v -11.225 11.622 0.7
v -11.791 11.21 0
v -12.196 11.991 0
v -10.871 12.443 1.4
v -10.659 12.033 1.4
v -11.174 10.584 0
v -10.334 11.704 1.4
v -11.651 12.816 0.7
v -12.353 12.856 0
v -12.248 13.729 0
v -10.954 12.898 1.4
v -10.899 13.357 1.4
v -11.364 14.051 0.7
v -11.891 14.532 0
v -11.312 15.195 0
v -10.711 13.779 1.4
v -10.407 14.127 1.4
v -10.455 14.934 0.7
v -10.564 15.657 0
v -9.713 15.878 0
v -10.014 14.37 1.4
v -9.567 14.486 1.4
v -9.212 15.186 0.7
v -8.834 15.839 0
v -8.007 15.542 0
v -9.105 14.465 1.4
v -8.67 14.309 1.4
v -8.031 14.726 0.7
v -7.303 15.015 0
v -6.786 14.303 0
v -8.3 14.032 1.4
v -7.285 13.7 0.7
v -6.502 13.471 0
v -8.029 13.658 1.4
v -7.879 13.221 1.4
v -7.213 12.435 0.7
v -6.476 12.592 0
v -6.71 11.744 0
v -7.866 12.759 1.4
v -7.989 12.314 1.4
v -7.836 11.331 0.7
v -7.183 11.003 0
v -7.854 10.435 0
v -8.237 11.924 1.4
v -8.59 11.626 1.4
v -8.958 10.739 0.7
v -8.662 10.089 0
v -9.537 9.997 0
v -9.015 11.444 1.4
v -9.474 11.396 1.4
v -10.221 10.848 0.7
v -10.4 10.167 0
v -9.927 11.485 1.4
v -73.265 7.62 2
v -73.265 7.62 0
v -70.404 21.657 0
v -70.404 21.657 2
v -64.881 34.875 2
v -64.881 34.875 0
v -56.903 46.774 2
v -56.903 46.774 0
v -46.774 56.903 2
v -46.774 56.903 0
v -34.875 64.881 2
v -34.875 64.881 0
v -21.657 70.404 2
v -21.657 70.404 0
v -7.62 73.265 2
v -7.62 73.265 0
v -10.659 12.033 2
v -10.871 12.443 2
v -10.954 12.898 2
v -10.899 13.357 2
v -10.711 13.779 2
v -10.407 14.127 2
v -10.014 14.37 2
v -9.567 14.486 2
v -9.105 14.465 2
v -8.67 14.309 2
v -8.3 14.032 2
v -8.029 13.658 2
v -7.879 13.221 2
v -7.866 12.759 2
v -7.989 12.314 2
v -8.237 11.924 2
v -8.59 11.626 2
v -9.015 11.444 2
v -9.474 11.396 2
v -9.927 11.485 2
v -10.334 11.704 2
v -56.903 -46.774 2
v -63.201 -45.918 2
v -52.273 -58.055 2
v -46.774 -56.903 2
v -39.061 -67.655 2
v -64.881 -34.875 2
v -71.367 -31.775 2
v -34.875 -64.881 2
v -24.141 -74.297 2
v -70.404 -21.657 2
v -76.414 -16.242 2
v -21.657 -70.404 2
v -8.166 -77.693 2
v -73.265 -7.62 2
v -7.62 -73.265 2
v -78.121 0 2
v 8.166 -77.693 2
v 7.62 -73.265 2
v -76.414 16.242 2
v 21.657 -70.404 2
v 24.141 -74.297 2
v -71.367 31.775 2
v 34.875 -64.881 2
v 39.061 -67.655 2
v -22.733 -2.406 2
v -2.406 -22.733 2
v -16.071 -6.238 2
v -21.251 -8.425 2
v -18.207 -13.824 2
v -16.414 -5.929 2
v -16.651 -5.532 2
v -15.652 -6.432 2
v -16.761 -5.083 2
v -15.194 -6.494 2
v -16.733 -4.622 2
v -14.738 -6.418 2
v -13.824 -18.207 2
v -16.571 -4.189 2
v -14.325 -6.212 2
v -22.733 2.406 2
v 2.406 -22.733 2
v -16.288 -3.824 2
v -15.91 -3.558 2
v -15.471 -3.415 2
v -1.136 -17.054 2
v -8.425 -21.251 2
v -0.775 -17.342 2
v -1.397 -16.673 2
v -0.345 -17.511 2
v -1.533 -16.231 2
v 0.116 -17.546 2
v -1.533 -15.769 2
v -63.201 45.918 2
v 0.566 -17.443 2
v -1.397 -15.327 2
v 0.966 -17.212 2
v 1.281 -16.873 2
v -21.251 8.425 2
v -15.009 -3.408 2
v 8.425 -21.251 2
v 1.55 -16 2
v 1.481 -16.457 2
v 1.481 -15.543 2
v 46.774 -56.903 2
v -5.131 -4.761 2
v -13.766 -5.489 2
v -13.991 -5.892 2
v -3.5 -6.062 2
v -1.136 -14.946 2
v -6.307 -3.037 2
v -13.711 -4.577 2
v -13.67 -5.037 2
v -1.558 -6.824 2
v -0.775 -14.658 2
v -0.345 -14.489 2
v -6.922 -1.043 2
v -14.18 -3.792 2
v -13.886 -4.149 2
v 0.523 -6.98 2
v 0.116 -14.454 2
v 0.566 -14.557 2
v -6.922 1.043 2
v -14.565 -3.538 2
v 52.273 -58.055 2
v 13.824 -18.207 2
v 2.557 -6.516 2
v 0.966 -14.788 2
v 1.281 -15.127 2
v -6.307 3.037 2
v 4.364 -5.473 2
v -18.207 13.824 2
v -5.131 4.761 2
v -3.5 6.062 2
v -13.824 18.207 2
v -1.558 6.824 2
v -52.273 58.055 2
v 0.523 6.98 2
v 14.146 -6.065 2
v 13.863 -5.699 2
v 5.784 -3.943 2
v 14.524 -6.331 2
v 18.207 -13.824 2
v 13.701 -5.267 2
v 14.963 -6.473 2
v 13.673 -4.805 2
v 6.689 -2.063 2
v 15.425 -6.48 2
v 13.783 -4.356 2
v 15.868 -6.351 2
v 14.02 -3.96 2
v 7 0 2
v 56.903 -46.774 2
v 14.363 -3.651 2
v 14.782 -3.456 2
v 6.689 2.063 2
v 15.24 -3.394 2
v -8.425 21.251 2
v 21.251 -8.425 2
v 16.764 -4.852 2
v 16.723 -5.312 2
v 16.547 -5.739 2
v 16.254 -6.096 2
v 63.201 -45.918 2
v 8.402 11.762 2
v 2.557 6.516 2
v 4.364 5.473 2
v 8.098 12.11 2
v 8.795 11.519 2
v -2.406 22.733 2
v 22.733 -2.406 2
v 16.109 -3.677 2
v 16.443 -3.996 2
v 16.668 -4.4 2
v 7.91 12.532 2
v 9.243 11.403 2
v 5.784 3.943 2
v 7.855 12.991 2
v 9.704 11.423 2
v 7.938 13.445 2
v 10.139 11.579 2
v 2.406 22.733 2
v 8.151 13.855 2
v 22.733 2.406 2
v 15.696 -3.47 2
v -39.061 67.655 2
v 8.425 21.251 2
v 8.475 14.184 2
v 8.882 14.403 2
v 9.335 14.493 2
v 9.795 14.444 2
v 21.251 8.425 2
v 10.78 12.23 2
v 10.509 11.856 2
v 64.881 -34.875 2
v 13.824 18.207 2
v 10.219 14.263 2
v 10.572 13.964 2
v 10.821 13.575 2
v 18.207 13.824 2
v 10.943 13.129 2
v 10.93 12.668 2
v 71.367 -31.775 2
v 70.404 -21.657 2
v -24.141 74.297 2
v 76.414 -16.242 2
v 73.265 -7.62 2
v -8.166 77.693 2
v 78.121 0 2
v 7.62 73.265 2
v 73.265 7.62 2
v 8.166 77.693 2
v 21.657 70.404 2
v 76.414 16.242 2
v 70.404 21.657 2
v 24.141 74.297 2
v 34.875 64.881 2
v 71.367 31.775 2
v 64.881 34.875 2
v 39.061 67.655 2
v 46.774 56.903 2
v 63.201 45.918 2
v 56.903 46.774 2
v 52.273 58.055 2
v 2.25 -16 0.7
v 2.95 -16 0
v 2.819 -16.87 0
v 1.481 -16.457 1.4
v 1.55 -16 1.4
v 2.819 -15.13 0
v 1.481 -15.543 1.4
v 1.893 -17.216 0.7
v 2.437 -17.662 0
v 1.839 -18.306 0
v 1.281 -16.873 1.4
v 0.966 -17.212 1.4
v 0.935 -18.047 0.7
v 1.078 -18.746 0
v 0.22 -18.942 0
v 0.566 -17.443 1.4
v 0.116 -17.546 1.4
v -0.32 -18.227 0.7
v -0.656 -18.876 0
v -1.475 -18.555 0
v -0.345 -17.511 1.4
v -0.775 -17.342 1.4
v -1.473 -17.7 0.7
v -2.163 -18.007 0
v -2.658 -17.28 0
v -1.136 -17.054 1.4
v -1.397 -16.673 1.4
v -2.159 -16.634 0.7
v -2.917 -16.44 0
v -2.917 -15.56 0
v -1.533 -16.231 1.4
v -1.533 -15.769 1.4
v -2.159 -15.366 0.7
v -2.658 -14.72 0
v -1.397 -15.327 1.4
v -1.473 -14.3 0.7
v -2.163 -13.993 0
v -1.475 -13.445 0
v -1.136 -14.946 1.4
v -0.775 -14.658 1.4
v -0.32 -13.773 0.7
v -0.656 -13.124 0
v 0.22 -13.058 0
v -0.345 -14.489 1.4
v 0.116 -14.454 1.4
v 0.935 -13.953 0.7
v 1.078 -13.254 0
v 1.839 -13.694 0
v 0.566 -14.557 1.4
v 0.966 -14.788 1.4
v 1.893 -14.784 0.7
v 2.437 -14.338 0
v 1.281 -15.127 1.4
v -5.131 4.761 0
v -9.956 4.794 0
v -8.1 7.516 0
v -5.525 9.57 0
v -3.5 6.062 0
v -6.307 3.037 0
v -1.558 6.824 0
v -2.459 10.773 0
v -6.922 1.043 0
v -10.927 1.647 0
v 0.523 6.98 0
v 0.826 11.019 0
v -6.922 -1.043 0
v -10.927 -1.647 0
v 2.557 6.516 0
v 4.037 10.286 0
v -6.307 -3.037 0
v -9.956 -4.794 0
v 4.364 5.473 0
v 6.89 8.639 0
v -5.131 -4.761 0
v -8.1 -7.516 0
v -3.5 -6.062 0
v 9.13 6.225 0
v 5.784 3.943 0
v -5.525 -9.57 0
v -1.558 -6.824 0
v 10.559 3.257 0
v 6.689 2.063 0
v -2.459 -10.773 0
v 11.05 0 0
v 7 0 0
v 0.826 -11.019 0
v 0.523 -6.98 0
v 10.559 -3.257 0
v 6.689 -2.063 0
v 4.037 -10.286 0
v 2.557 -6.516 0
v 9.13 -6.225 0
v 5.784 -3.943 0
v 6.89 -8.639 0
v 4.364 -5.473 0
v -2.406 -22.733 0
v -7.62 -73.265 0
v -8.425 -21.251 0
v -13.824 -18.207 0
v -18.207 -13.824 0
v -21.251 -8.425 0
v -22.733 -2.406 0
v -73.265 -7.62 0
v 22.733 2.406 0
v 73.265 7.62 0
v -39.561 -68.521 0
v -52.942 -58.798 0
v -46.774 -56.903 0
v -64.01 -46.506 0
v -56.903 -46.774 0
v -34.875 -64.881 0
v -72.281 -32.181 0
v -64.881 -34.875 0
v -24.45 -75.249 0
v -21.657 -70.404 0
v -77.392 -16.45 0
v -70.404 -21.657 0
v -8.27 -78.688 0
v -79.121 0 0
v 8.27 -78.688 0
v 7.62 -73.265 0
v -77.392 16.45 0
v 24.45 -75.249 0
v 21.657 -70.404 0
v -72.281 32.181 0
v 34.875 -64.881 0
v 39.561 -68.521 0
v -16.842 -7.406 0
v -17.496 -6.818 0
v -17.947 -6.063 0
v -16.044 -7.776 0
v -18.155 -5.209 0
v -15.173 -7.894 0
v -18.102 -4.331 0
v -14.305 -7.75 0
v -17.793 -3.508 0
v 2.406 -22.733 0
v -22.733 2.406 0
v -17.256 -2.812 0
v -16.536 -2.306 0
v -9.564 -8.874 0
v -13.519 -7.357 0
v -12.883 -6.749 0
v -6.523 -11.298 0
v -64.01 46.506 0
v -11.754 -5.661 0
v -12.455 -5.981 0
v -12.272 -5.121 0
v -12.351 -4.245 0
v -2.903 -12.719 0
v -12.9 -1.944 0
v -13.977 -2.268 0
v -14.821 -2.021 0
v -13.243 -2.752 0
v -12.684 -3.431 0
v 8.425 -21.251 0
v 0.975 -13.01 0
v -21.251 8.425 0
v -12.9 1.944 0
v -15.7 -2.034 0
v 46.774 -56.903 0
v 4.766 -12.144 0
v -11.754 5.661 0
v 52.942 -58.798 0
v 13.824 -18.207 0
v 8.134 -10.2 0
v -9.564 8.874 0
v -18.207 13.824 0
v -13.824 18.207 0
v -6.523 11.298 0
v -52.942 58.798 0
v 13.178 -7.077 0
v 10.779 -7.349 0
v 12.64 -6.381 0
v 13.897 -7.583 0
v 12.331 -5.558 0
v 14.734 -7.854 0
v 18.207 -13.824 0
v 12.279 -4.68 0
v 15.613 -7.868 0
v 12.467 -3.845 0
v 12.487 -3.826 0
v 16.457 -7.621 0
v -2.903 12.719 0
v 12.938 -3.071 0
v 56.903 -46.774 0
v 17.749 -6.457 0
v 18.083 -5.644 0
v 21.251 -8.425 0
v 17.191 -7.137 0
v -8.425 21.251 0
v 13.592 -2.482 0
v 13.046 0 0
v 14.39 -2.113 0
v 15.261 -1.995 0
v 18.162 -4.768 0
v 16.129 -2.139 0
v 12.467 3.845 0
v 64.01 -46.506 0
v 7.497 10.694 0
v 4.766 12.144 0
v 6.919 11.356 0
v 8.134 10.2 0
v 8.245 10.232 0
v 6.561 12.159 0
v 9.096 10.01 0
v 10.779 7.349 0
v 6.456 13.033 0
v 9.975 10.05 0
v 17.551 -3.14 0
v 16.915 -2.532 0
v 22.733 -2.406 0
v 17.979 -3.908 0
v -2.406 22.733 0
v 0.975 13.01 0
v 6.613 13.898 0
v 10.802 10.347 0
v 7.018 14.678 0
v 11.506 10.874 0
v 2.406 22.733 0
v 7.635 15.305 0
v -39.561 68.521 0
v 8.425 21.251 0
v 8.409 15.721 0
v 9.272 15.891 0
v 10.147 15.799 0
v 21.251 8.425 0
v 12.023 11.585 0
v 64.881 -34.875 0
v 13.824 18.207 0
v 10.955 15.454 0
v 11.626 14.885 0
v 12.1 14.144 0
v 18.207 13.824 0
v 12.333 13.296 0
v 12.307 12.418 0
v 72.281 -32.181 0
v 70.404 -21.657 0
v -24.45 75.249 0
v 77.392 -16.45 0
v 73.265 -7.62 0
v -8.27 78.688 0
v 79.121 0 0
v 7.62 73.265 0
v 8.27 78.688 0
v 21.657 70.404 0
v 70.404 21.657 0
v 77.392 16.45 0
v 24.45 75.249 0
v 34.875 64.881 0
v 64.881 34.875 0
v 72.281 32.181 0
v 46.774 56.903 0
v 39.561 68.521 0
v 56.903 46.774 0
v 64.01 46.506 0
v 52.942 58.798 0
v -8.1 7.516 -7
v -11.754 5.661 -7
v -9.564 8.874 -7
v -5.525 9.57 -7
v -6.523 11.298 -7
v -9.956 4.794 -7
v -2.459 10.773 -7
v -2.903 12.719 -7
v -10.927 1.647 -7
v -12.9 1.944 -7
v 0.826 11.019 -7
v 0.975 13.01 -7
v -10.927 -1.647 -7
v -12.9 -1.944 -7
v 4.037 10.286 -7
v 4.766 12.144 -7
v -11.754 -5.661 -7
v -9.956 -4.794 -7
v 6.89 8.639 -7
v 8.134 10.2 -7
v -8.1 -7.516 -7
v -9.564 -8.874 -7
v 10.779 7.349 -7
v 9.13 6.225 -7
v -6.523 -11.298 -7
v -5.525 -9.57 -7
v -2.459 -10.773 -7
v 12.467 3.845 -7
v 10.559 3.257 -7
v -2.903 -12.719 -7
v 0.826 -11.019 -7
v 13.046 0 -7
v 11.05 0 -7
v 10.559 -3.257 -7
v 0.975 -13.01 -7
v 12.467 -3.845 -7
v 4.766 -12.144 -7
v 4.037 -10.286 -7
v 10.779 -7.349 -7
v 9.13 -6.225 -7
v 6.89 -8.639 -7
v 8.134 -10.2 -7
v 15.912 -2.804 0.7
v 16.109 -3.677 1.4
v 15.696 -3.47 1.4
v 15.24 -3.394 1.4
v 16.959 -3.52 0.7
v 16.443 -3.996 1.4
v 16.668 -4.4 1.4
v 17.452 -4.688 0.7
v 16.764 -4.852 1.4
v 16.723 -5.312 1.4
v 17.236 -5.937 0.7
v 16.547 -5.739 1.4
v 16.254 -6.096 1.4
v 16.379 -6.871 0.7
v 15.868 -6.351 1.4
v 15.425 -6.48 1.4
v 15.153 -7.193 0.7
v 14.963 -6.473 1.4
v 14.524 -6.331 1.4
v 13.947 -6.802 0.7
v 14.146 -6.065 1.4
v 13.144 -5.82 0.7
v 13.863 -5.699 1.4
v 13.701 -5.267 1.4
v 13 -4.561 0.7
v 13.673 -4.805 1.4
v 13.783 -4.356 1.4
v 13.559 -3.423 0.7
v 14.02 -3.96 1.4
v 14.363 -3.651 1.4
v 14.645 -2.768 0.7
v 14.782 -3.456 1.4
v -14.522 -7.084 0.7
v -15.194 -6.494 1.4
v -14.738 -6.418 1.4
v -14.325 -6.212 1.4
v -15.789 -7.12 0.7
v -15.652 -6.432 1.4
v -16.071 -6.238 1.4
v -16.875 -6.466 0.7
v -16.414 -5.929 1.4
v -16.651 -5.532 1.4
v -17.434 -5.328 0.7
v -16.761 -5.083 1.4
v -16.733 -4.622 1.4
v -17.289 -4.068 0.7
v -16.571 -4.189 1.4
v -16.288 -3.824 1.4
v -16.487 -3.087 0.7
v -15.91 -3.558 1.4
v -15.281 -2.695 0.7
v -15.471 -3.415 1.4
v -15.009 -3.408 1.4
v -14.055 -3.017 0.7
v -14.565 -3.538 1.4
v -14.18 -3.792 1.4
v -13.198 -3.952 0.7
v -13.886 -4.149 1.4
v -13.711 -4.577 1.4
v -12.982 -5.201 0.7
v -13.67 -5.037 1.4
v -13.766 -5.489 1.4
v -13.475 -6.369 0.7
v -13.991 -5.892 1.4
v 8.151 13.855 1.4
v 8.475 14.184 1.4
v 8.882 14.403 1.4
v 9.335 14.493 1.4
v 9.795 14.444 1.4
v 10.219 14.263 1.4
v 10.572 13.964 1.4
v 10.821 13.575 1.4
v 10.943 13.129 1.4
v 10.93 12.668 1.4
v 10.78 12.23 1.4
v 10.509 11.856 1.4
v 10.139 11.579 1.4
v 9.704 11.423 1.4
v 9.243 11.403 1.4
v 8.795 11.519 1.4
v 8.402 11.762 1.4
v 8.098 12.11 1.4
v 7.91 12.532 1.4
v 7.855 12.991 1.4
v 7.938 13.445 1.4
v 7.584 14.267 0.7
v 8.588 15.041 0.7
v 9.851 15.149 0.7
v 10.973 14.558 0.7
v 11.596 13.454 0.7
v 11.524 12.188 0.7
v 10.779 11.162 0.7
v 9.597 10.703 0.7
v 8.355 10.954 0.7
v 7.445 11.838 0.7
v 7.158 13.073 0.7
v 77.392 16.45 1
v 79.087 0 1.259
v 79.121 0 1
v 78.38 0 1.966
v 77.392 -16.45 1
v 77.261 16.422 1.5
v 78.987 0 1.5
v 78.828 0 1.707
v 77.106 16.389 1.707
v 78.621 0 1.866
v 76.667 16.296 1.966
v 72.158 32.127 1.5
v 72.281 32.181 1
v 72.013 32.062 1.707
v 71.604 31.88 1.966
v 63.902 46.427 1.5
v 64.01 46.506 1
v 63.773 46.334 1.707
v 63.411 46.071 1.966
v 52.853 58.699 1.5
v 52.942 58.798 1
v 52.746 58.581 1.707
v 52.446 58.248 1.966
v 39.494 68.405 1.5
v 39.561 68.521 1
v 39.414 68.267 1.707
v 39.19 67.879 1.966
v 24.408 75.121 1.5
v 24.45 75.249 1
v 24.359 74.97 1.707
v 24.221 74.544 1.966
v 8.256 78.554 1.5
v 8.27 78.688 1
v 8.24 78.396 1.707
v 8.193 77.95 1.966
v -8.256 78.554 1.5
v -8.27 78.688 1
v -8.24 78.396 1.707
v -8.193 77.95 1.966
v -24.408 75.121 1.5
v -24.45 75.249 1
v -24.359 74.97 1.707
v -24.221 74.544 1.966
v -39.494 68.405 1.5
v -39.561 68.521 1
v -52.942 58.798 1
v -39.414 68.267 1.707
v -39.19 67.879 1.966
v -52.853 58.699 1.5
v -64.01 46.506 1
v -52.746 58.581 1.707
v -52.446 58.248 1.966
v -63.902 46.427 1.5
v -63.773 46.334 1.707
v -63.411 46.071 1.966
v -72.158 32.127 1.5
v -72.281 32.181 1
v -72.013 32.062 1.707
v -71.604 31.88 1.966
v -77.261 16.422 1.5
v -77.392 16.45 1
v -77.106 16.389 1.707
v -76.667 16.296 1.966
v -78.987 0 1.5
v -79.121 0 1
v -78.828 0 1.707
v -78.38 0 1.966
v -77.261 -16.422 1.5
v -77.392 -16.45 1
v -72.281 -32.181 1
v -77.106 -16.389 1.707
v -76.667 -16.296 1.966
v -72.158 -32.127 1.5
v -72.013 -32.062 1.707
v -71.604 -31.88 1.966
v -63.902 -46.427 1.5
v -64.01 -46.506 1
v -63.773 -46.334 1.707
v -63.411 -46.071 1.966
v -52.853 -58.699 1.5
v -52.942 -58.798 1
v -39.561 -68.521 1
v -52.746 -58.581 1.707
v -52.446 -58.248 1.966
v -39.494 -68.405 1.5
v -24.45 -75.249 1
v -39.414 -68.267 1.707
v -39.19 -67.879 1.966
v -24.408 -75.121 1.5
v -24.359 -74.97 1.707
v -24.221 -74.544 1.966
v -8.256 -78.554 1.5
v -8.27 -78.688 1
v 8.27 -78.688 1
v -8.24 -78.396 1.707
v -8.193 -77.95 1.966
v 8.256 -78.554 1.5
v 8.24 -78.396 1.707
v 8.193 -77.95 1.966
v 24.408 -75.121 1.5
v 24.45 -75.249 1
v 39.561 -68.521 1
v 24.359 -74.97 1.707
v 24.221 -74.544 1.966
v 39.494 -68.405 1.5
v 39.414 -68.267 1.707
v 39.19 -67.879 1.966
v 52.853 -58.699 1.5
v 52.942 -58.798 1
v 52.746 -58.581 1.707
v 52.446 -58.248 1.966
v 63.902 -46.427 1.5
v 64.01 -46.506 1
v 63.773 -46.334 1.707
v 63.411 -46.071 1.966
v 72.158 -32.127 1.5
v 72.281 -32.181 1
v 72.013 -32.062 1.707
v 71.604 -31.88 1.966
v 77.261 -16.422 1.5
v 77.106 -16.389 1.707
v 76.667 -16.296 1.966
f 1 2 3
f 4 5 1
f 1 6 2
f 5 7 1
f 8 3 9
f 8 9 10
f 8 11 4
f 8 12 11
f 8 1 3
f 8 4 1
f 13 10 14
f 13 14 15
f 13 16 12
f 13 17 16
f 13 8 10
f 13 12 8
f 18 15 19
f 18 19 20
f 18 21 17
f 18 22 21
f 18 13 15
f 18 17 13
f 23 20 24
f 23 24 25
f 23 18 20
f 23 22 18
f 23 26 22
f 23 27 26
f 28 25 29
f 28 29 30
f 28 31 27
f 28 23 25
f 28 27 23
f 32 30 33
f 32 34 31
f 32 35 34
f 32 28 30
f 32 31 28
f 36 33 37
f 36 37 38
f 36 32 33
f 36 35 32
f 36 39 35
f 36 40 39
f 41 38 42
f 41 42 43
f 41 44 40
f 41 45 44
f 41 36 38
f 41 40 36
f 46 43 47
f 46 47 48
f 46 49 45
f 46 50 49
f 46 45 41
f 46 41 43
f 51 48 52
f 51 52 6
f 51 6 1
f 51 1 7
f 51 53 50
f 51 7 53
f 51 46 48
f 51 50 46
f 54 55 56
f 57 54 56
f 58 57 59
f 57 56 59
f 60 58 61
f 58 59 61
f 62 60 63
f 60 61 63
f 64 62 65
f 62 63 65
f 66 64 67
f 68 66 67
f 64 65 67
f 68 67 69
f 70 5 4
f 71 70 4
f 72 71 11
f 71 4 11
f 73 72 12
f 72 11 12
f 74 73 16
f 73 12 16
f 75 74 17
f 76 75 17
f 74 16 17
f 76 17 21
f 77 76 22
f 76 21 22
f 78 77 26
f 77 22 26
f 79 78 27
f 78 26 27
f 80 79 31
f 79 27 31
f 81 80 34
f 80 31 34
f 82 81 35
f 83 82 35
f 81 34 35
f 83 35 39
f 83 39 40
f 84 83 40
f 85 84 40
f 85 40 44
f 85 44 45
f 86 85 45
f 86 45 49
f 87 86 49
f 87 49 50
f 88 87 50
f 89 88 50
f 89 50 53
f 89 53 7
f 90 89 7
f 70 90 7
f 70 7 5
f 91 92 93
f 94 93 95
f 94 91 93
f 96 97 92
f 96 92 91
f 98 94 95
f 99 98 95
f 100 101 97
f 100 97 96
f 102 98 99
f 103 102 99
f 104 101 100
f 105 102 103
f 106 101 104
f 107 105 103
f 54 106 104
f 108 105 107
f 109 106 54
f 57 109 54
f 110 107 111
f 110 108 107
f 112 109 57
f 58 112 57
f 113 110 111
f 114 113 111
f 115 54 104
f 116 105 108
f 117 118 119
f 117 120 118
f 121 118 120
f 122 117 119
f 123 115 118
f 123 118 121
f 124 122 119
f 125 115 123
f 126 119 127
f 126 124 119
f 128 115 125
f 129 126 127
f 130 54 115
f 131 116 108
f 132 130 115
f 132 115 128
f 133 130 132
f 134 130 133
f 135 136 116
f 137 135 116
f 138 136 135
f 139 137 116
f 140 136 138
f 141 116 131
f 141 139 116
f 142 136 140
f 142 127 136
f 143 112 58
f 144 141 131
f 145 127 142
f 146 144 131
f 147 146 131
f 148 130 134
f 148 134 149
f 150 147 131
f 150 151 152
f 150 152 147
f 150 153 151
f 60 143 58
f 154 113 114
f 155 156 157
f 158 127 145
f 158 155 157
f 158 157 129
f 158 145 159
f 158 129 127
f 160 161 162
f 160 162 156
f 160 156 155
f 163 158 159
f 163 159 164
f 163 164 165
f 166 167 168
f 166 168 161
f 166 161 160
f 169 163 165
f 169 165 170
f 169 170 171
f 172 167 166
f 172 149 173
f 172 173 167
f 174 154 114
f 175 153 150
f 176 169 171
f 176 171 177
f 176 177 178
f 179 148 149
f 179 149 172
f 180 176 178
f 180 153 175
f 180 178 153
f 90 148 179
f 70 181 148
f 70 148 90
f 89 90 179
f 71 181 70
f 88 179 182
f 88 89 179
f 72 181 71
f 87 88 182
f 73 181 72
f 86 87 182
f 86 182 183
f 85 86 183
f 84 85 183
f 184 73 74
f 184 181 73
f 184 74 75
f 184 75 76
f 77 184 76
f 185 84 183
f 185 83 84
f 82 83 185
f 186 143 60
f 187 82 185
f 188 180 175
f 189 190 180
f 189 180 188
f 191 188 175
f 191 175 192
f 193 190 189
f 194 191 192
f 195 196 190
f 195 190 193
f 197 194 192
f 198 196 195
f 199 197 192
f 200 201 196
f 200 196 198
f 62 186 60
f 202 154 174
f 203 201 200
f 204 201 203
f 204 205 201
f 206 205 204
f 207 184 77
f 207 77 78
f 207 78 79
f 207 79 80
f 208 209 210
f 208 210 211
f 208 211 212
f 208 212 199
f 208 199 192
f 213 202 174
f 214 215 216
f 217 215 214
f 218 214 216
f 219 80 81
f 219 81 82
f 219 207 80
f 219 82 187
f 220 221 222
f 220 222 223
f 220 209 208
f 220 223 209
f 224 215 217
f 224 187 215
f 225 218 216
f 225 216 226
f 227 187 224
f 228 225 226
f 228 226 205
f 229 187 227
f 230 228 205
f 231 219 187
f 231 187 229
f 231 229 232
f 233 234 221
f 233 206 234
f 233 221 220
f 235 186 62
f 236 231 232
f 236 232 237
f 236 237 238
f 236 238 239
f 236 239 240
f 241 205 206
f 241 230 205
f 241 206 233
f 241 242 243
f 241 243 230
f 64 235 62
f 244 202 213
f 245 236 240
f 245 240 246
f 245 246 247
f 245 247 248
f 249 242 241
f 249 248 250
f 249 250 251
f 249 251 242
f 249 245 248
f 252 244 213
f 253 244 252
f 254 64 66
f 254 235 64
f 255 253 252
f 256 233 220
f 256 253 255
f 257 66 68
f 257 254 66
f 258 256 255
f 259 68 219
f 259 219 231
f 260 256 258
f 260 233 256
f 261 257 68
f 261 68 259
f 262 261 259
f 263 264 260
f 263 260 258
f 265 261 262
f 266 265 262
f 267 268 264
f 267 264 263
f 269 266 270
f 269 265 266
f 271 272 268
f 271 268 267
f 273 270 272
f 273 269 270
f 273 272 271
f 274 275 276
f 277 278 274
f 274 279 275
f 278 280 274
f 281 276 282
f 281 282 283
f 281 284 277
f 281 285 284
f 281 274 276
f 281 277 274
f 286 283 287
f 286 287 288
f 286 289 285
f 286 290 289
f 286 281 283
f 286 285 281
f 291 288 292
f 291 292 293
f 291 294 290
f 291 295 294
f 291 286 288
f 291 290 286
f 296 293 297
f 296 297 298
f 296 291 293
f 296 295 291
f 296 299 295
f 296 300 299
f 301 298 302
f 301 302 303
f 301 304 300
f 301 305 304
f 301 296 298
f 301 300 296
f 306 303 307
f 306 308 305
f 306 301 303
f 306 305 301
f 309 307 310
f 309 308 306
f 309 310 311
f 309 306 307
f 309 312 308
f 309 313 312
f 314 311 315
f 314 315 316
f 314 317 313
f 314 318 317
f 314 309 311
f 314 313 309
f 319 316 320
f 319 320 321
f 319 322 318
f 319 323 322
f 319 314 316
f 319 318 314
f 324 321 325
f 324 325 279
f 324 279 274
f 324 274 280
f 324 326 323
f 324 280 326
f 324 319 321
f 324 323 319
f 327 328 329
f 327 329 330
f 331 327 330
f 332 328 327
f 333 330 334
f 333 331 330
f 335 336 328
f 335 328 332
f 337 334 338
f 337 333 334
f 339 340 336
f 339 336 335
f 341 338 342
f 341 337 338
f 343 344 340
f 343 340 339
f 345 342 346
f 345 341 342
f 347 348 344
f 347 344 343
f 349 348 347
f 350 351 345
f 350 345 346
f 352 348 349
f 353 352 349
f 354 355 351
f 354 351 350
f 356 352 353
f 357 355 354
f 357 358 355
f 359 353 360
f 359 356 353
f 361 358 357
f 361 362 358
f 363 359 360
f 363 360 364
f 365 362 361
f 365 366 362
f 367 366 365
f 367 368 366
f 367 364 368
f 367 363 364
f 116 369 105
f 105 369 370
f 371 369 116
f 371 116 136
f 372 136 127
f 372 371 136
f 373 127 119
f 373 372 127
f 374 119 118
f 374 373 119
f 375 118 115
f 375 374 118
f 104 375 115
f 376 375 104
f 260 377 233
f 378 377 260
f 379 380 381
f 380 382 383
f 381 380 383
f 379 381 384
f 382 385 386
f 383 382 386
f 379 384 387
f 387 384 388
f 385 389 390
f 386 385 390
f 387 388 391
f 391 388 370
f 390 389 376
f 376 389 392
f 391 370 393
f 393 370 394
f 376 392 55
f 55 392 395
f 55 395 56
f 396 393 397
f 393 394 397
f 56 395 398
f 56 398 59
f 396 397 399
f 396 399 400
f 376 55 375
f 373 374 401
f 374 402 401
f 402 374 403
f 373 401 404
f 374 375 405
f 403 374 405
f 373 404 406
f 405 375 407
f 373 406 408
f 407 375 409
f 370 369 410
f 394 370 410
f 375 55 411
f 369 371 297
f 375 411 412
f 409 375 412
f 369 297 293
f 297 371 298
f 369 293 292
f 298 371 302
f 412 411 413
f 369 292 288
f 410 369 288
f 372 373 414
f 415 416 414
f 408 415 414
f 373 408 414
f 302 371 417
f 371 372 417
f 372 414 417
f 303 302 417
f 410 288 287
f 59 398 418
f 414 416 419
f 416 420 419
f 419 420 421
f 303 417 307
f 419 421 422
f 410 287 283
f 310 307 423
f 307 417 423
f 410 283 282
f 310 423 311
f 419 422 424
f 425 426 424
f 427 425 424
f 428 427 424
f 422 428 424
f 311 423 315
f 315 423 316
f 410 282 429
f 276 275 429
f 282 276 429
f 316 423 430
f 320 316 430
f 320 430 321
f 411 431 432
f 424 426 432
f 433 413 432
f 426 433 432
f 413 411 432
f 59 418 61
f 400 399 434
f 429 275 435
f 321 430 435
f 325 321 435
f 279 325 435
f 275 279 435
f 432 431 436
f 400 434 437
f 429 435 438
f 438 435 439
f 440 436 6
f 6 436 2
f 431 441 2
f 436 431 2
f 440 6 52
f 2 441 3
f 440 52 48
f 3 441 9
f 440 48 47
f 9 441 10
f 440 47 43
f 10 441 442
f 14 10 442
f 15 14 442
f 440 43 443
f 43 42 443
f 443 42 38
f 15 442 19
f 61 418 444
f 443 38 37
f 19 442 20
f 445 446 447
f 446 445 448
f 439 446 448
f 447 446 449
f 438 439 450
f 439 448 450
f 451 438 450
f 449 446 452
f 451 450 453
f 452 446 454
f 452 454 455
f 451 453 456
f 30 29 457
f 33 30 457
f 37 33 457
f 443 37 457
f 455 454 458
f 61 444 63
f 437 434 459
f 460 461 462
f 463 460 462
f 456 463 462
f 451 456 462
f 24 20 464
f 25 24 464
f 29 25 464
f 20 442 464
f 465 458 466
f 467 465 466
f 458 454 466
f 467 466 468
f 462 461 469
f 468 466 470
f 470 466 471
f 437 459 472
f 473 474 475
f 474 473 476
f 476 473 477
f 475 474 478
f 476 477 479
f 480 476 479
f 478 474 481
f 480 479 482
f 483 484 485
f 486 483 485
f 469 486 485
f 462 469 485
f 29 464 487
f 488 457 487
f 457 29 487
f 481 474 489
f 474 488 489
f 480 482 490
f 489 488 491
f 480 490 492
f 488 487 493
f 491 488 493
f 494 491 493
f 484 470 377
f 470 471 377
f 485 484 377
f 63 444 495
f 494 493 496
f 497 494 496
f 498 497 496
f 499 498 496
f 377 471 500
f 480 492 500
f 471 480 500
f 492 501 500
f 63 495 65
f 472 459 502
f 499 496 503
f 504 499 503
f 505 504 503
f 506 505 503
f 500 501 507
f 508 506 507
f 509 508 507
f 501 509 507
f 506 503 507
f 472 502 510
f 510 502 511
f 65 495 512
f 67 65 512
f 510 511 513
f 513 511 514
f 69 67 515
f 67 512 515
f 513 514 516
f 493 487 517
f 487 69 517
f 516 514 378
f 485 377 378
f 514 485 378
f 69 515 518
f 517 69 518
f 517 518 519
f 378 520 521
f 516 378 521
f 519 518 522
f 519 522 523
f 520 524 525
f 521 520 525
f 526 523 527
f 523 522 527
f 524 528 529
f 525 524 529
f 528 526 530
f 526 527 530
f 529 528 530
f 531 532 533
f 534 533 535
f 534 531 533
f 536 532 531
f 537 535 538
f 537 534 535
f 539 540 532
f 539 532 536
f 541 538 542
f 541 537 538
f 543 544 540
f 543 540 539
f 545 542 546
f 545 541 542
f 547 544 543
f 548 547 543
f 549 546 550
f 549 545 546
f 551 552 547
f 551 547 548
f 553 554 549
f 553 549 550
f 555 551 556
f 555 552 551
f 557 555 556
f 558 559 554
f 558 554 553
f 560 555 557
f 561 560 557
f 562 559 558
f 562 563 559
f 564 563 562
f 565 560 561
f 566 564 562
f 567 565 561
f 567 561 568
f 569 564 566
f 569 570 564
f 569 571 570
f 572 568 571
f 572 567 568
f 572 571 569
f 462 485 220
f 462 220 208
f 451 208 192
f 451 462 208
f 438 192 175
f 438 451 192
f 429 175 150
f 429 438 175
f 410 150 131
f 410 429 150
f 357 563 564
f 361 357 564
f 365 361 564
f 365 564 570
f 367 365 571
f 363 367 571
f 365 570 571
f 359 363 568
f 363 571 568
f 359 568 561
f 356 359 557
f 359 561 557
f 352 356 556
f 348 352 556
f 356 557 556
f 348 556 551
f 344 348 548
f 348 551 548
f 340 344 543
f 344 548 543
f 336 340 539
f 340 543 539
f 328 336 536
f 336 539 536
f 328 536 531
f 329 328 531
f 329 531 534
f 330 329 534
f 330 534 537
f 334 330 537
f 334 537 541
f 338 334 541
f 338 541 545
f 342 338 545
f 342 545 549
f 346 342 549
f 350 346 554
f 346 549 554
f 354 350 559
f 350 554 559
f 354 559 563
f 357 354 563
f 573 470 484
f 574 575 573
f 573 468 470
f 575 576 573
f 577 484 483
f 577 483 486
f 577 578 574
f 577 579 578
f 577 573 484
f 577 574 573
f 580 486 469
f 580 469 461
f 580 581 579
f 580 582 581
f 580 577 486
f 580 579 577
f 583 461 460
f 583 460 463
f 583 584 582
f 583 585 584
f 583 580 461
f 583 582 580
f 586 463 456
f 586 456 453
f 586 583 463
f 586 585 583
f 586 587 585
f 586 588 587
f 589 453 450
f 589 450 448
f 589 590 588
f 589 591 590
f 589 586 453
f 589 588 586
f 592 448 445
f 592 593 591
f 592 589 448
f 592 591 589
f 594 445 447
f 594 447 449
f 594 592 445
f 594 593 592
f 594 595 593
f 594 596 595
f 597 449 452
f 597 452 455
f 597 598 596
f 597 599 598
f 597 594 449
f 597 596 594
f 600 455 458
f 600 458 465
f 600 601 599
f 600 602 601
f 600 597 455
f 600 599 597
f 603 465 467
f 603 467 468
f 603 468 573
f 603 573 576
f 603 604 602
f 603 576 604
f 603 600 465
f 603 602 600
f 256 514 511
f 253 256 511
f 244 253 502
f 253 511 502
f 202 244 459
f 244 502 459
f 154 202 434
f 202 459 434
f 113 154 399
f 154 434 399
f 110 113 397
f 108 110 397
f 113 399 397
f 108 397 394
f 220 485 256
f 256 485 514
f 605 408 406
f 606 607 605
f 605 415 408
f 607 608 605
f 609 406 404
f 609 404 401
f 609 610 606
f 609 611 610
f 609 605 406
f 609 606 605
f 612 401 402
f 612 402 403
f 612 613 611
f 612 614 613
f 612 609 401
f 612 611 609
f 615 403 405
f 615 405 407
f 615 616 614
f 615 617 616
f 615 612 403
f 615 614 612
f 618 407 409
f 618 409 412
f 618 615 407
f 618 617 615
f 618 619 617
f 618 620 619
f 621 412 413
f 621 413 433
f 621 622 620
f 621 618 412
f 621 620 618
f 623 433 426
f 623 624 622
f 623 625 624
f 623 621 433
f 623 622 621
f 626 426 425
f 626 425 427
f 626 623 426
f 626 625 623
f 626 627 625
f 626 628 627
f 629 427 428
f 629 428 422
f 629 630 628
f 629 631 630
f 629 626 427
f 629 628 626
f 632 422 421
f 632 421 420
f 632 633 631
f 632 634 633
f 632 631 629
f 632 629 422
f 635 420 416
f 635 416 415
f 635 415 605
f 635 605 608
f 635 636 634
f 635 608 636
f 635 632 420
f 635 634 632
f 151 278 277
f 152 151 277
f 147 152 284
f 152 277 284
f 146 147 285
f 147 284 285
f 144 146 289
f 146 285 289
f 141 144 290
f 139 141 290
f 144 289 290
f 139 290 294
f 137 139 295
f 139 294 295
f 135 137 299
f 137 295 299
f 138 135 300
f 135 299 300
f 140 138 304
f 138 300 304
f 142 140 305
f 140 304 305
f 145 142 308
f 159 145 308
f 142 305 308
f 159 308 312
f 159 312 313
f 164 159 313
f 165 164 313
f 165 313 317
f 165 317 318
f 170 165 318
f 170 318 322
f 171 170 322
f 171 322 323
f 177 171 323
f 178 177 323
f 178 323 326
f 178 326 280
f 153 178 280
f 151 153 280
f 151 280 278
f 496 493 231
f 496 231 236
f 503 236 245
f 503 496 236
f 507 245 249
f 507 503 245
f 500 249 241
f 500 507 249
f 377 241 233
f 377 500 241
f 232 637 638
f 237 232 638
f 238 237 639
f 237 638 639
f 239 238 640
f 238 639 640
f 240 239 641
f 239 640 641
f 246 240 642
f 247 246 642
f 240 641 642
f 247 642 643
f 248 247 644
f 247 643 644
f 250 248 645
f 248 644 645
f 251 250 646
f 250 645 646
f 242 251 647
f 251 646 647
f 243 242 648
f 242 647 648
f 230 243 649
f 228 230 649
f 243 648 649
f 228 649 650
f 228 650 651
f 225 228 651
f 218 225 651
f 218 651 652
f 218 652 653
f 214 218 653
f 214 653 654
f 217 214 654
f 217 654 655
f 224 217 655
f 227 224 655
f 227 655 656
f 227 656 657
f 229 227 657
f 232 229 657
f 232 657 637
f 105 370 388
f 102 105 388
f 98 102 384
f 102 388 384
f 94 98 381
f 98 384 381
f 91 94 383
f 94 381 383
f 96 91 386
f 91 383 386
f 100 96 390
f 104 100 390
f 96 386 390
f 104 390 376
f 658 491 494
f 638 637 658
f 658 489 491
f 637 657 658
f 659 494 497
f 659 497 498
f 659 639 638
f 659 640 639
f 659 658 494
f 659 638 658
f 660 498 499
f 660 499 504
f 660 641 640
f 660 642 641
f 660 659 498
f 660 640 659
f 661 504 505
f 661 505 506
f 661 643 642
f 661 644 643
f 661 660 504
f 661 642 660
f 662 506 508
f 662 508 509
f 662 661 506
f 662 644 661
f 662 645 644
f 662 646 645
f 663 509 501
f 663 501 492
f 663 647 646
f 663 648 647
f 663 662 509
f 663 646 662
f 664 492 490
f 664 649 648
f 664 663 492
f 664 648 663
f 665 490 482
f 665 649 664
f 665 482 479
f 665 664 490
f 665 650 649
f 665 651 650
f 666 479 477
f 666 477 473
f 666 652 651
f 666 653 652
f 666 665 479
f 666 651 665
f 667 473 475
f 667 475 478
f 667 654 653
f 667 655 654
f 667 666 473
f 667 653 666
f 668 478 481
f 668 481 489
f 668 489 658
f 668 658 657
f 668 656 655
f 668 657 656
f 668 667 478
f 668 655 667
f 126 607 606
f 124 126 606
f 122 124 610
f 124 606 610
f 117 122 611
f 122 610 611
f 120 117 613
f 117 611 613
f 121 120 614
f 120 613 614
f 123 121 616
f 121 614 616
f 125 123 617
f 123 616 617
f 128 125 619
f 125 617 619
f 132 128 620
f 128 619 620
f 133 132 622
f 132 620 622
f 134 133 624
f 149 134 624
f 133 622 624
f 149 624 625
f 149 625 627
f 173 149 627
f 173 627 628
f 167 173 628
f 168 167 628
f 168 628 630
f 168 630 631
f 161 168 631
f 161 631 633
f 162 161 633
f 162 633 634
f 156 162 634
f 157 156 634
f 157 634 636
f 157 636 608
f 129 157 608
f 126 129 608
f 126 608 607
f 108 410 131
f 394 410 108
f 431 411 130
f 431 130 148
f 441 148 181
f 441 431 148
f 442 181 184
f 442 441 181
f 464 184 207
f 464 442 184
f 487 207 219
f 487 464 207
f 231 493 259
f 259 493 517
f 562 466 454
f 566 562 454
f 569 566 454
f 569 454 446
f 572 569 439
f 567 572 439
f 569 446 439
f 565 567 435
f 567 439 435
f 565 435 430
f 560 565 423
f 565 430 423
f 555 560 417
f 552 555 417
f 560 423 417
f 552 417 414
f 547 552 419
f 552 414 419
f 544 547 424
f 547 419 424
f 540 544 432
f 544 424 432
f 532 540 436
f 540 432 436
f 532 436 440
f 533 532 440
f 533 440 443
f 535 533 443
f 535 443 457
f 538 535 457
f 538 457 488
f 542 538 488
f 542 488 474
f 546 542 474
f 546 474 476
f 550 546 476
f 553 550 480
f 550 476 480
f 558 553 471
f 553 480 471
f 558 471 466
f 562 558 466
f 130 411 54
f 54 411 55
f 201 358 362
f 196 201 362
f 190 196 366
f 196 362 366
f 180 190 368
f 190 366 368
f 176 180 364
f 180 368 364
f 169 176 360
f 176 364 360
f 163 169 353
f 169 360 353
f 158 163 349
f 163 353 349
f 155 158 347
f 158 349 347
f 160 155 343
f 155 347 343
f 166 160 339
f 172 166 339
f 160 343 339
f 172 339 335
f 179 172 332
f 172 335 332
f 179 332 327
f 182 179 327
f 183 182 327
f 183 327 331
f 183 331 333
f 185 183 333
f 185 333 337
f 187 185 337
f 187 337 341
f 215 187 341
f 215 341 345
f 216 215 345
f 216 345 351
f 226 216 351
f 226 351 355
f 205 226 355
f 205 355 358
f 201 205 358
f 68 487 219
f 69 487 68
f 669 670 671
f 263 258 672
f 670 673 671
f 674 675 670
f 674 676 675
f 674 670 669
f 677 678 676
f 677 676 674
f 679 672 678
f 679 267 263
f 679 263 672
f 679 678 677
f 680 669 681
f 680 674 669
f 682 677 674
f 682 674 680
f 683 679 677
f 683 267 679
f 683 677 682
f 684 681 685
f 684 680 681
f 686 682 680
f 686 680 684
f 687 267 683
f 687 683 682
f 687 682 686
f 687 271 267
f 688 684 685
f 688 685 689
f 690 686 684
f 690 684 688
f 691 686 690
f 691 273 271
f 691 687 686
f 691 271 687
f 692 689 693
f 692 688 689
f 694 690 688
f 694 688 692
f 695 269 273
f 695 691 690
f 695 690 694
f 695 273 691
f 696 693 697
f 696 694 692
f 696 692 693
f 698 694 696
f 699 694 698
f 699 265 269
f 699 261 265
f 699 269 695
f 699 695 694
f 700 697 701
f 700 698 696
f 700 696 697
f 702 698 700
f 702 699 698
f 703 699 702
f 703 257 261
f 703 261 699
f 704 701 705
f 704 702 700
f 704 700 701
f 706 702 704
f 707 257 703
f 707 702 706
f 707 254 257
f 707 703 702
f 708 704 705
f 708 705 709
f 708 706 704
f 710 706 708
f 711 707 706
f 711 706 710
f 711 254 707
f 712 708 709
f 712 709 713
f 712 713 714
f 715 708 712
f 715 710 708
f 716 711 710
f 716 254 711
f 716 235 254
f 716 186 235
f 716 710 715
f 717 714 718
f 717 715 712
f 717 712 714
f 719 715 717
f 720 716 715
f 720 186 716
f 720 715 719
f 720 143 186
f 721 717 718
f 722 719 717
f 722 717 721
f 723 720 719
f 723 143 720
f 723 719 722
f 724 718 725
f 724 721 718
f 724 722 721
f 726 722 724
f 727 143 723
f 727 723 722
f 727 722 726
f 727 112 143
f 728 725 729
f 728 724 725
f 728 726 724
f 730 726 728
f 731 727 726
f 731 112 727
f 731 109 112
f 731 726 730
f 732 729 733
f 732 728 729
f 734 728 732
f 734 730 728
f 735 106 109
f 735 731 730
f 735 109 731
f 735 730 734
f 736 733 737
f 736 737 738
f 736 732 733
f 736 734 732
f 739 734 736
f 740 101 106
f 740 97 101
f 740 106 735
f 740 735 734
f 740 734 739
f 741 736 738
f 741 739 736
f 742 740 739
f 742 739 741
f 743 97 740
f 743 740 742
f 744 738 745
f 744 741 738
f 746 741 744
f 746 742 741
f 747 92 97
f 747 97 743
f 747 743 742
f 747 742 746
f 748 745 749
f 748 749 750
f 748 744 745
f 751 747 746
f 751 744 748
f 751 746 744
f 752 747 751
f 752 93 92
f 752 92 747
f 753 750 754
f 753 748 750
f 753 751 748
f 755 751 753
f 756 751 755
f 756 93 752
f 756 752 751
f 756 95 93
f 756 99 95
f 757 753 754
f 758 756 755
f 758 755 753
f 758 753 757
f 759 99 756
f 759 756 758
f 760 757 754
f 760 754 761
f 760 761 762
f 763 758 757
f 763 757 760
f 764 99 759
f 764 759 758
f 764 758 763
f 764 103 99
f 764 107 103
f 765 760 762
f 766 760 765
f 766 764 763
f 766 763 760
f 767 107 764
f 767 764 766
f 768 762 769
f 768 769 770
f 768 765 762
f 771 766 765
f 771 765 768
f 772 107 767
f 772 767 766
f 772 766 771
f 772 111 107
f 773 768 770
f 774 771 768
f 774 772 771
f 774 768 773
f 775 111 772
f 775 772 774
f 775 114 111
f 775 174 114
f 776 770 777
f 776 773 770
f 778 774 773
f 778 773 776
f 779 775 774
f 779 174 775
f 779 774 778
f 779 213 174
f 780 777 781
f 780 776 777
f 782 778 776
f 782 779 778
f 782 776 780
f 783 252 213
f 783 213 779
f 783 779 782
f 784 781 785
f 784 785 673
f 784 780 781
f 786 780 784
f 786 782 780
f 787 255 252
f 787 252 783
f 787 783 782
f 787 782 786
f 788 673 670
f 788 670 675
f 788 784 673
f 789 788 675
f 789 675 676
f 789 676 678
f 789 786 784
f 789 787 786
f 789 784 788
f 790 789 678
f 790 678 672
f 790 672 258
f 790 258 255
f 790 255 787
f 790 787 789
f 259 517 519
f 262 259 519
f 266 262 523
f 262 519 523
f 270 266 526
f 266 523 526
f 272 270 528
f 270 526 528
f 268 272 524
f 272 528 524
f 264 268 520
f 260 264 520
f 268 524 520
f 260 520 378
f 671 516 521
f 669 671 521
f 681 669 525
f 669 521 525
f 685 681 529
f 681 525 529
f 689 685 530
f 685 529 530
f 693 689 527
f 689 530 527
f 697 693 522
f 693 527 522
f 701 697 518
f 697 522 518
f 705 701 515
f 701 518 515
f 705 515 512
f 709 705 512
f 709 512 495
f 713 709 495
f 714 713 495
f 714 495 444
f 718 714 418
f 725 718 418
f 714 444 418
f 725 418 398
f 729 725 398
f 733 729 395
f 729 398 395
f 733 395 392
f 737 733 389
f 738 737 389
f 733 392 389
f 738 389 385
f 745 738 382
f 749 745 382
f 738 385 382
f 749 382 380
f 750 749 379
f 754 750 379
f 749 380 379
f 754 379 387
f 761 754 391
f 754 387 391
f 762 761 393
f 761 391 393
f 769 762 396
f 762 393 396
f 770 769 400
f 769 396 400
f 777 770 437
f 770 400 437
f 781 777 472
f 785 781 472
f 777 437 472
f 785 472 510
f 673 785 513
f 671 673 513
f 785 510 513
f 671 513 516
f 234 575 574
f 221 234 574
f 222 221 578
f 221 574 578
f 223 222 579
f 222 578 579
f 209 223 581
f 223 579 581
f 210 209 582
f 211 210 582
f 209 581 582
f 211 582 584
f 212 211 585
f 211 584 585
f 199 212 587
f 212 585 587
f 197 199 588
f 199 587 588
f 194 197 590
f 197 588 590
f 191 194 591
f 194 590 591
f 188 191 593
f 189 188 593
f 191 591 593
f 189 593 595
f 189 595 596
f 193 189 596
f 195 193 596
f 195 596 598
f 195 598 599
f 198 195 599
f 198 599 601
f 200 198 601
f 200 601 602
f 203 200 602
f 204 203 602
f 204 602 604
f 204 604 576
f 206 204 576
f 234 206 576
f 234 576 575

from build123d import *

# Parameters (mm, degrees)
SKETCH005_R           = 79.121
PAD_DEPTH             = 2
SKETCH010_R           = 13.0462
PAD001_DEPTH          = 7
SKETCH007_R           = 11.05
POCKET005_DEPTH       = 7
SKETCH006_R           = 7
POCKET006_DEPTH       = 5.0038
SKETCH008_R           = 1.55
POCKET007_DEPTH       = 5.0038
POLARPATTERN002_COUNT = 5
CHAMFER001_SIZE       = 1.4
POCKET008_DEPTH       = 5.0038
POLARPATTERN003_COUNT = 4
FILLET_R              = 0.999998


with BuildPart() as part:
    # Sketch005 → Pad (new body)
    with BuildSketch(Plane.XY):
        Circle(SKETCH005_R)
    extrude(amount=PAD_DEPTH)

    # Sketch010 (on Face2 of Pad) → Pad001 (join)
    with BuildSketch(Plane(origin=(0, 0, 0), x_dir=(1, 0, 0), z_dir=(0, 0, -1))):
        Circle(SKETCH010_R)
    extrude(amount=PAD001_DEPTH)

    # Sketch007 (on Face5 of Pad001) → Pocket005 (cut)
    with BuildSketch(Plane(origin=(0, 0, -7), x_dir=(1, 0, 0), z_dir=(0, 0, -1))):
        Circle(SKETCH007_R)
    extrude(amount=-POCKET005_DEPTH, mode=Mode.SUBTRACT)

    # Sketch006 (on Face801 of TimingGearT) → Pocket006 (cut)
    with BuildSketch(Plane(origin=(0, 0, 0), x_dir=(1, 0, 0), z_dir=(0, 0, -1))):
        Circle(SKETCH006_R)
    extrude(amount=-POCKET006_DEPTH, mode=Mode.SUBTRACT)

    # Sketch008 (on Face4 of Pocket002) → Pocket007 (cut)
    with BuildSketch(Plane(origin=(0, 0, 0), x_dir=(1, 0, 0), z_dir=(0, 0, -1))):
        with Locations((0, 16)):
            Circle(SKETCH008_R)
    pocket007 = extrude(amount=-POCKET007_DEPTH, mode=Mode.SUBTRACT)

    # PolarPattern002: Pocket007 ×5 about axis
    polarpattern002_axis = Axis((0, 0, 0), (0, 0, -1))
    for i in range(1, POLARPATTERN002_COUNT):
        add(pocket007.rotate(polarpattern002_axis, i * 360 / POLARPATTERN002_COUNT), mode=Mode.SUBTRACT)

    # Chamfer001
    chamfer001_edges = [part.edges().sort_by_distance(p)[0] for p in [
        (-1.55, -16, 0),
        (14.737928, -6.41841, 0),
        (-15.695881, -3.470134, 0),
        (-8.150588, 13.855339, 0),
        (10.65854, 12.033205, 0),
    ]]
    chamfer(chamfer001_edges, length=CHAMFER001_SIZE)

    # Sketch009 (on Face1 of Chamfer) → Pocket008 (cut)
    with BuildSketch(Plane(origin=(0, 0, 0), x_dir=(1, 0, 0), z_dir=(0, 0, -1))):
        with BuildLine():
            ThreePointArc((-2.406307, 22.733), (-16.164461, 16.164461), (-22.733, 2.406307))
            Line((-22.733, 2.406307), (-73.264802, 7.62))
            ThreePointArc((-7.62, 73.264802), (-52.085486, 52.085486), (-73.264802, 7.62))
            Line((-2.406307, 22.733), (-7.62, 73.264802))
        make_face()
    pocket008 = extrude(amount=-POCKET008_DEPTH, mode=Mode.SUBTRACT)

    # PolarPattern003: Pocket008 ×4 about axis
    polarpattern003_axis = Axis((0, 0, 0), (0, 0, -1))
    for i in range(1, POLARPATTERN003_COUNT):
        add(pocket008.rotate(polarpattern003_axis, i * 360 / POLARPATTERN003_COUNT), mode=Mode.SUBTRACT)

    # Fillet
    fillet_edges = [part.edges().sort_by_distance(p)[0] for p in [
        (-79.121, 0, 2),
    ]]
    fillet(fillet_edges, radius=FILLET_R)


solid = part.part
